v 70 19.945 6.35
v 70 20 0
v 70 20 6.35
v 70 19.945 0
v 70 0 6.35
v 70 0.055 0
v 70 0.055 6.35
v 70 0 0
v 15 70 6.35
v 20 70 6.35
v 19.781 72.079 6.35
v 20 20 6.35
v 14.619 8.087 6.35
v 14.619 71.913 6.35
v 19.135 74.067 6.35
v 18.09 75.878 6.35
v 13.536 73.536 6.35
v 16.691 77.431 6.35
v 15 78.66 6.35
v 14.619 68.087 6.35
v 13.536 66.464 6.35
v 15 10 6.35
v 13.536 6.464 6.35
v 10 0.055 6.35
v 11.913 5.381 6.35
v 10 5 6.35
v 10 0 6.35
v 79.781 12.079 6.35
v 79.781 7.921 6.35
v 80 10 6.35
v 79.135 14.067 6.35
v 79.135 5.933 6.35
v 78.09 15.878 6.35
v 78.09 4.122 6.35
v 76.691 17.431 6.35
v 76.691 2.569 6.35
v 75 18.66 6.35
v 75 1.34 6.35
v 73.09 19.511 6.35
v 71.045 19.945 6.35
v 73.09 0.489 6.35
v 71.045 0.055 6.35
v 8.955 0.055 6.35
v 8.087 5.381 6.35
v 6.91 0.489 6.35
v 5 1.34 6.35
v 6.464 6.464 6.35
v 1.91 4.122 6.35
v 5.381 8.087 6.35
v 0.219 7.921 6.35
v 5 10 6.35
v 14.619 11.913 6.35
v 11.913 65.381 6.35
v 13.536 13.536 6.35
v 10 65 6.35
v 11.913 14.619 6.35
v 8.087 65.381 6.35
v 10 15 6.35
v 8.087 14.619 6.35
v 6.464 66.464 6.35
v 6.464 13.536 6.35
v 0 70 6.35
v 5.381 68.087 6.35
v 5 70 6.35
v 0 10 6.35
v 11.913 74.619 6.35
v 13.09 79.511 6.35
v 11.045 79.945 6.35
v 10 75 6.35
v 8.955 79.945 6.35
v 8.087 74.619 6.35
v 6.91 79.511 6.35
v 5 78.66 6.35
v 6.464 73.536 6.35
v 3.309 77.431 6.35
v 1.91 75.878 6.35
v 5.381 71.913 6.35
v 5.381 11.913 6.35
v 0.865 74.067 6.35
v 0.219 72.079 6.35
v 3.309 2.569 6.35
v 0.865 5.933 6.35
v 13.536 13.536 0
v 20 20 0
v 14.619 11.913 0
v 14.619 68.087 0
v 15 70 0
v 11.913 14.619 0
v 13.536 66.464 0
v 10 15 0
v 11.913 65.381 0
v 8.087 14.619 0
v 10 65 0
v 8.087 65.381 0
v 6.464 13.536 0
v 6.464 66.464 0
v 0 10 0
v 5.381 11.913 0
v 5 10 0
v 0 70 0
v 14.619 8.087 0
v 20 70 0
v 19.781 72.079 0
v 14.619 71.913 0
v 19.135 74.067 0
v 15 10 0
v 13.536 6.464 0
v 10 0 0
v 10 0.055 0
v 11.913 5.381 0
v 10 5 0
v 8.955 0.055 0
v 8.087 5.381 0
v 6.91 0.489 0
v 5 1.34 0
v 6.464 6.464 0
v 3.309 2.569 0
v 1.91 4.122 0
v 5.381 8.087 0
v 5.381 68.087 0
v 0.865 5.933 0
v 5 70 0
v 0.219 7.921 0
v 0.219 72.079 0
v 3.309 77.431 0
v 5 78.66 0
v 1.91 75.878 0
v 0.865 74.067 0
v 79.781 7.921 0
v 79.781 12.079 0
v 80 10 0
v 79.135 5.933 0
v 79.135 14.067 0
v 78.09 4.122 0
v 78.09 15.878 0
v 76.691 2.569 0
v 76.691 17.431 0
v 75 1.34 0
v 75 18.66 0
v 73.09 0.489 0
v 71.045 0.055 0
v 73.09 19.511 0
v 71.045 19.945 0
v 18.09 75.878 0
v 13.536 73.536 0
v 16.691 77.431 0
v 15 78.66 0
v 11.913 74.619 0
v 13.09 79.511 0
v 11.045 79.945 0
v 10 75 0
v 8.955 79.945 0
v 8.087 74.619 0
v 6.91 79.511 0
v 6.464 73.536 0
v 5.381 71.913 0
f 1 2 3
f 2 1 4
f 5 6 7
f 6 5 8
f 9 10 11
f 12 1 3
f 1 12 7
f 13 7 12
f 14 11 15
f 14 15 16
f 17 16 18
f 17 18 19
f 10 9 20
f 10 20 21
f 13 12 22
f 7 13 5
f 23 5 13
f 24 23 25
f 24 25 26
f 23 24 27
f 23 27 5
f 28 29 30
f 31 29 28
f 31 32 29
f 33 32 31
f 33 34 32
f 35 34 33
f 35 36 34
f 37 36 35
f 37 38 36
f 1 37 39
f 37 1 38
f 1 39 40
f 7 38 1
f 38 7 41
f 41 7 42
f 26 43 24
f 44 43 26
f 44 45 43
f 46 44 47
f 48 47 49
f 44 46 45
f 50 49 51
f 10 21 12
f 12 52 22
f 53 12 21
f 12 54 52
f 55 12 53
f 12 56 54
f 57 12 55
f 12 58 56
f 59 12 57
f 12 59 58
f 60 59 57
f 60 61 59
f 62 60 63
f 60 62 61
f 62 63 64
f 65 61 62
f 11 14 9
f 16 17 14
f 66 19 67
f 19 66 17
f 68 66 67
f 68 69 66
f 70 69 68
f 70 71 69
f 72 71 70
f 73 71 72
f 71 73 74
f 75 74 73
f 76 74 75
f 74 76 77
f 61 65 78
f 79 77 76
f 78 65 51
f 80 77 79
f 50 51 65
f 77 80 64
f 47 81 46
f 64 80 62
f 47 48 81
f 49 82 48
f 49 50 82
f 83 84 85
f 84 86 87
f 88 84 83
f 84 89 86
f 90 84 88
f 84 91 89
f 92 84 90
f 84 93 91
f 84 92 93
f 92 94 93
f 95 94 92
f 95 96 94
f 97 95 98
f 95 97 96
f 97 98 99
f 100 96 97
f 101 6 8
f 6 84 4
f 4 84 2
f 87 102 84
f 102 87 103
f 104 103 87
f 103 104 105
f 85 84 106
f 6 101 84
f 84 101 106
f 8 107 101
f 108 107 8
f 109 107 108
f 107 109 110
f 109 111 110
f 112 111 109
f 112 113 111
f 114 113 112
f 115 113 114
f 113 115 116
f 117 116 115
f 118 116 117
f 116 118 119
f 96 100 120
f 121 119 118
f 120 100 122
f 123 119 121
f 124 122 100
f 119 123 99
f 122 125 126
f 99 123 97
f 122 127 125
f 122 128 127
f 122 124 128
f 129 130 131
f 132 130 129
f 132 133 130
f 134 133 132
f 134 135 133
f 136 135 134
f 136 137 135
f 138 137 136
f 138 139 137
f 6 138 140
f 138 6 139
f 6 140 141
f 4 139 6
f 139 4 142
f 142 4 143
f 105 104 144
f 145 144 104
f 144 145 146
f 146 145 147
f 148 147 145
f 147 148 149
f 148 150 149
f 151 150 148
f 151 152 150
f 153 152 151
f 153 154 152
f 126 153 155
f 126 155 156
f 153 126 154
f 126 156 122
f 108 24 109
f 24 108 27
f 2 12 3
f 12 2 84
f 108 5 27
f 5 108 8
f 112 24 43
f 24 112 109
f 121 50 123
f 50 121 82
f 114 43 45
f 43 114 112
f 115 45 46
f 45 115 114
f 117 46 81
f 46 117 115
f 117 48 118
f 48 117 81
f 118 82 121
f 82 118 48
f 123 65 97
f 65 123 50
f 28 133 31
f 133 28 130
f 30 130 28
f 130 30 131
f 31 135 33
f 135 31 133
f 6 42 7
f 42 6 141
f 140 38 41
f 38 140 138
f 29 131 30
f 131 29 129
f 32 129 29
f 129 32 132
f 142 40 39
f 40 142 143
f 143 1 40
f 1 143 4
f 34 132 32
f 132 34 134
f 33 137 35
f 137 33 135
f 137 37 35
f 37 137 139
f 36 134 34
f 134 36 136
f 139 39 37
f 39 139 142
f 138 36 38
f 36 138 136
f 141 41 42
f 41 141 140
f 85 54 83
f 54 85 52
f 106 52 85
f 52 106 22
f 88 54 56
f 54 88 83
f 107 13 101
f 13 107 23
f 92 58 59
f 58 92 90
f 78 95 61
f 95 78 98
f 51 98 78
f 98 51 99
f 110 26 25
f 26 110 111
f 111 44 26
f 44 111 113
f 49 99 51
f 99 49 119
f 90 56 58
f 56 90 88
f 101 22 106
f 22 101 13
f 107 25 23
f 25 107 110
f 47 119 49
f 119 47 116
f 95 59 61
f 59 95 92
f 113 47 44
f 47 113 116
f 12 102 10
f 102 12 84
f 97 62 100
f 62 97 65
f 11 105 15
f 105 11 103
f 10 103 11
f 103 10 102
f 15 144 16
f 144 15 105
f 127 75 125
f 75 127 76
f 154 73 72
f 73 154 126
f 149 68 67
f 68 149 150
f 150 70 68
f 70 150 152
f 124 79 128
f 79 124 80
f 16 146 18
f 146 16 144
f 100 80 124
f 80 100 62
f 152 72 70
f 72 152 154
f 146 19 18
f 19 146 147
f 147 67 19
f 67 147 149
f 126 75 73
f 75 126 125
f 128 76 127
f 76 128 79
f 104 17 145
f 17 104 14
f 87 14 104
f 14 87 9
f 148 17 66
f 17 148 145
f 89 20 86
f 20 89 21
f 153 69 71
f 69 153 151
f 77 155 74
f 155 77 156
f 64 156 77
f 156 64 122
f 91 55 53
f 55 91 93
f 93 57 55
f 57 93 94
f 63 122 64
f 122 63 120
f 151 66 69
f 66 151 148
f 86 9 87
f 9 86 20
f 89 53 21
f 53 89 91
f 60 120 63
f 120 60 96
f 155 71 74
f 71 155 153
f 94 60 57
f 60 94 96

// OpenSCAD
module rounded_rect_x (r, l, h) {
   $rect_l = l;
   $rect_w = 4 * r;
   $rect_h = h;
   union () {
	   translate([2*r, 0, 0]) {
		    cube([$rect_l, $rect_w, $rect_h]);
	   }
	   translate([2*r, 2*r, 0]) {
		    cylinder(r=2*r, h=h);
	   }
	   translate([2*r+l, 2*r, 0]) {
		    cylinder(r=2*r, h=h);
	   }  
   }
}

module rounded_rect_p_x (r, l, h) {
   difference () {
      rounded_rect_x(r, l, h);
      translate([2*r, 2*r, -1])  {
         cylinder(r=r, h=h+2);
      }  
      translate([2*r, l+2*r, -1])  {
         cylinder(r=r, h=h+2);
      } 
   }
}

module rounded_rect_y (r, l, h) {
   $rect_l = l;
   $rect_w = 4 * r;
   $rect_h = h;
   union () {
	   translate([0, 2*r, 0]) {
		    cube([$rect_w, $rect_l, $rect_h]);
	   }
	   translate([2*r, 2*r, 0]) {
		    cylinder(r=2*r, h=h);
	   }
	   translate([2*r, 2*r+l, 0]) {
		    cylinder(r=2*r, h=h);
	   }  
   }
}


module rounded_rect_p_y (r, l, h) {
   difference () {
      rounded_rect_y(r, l, h);
      translate([2*r, 2*r, -1])  {
         cylinder(r=r, h=h+2);
      }  
      translate([2*r, l+2*r, -1])  {
         cylinder(r=r, h=h+2);
      } 
   }
}

$pierced = 1;
if (1 == $pierced) {
   union () {
      rounded_rect_p_x(r=5, l=60, h=6.35);
      rounded_rect_p_y(r=5, l=60, h=6.35);
   }
} else {
   union () {
      rounded_rect_x(r=5, l=60, h=6.35);
      rounded_rect_y(r=5, l=60, h=6.35);
   }
}

module mitered_box_x (ww, ll, hh) {
   $rr=ww/3;
   $lll = ll - 2*$rr; 
   translate ([$rr,$rr,0]) {
      minkowski() {
         cube([$lll,$rr,hh]);
         cylinder(r=$rr,h=hh);
      }
   }
}

module mitered_box_y (ww, ll, hh) {
   $rr=ww/3;
   $lll = ll - 2*$rr; 
   translate ([$rr,$rr,0]) {
      minkowski() {
         cube([$rr,$lll,hh]);
         cylinder(r=$rr,h=hh);
      }
   }
}

module duemilanove_hole_pattern_x (depth) {
    translate([0,0,0]) {
       cylinder(r=1.5,h=depth);
    }
    translate([0,27.9,0]) {
       cylinder(r=1.5,h=depth);
    }
    translate([50.8,27.9 + 15.2,0]) {
       cylinder(r=1.5,h=depth);
    }
}

module duemilanove_hole_pattern_y (depth) {
    translate([0,0,0]) {
       cylinder(r=1.5,h=depth);
    }
    translate([27.9,0,0]) {
       cylinder(r=1.5,h=depth);
    }
    translate([27.9 + 15.2, 50.8,0]) {
       cylinder(r=1.5,h=depth);
    }
}
